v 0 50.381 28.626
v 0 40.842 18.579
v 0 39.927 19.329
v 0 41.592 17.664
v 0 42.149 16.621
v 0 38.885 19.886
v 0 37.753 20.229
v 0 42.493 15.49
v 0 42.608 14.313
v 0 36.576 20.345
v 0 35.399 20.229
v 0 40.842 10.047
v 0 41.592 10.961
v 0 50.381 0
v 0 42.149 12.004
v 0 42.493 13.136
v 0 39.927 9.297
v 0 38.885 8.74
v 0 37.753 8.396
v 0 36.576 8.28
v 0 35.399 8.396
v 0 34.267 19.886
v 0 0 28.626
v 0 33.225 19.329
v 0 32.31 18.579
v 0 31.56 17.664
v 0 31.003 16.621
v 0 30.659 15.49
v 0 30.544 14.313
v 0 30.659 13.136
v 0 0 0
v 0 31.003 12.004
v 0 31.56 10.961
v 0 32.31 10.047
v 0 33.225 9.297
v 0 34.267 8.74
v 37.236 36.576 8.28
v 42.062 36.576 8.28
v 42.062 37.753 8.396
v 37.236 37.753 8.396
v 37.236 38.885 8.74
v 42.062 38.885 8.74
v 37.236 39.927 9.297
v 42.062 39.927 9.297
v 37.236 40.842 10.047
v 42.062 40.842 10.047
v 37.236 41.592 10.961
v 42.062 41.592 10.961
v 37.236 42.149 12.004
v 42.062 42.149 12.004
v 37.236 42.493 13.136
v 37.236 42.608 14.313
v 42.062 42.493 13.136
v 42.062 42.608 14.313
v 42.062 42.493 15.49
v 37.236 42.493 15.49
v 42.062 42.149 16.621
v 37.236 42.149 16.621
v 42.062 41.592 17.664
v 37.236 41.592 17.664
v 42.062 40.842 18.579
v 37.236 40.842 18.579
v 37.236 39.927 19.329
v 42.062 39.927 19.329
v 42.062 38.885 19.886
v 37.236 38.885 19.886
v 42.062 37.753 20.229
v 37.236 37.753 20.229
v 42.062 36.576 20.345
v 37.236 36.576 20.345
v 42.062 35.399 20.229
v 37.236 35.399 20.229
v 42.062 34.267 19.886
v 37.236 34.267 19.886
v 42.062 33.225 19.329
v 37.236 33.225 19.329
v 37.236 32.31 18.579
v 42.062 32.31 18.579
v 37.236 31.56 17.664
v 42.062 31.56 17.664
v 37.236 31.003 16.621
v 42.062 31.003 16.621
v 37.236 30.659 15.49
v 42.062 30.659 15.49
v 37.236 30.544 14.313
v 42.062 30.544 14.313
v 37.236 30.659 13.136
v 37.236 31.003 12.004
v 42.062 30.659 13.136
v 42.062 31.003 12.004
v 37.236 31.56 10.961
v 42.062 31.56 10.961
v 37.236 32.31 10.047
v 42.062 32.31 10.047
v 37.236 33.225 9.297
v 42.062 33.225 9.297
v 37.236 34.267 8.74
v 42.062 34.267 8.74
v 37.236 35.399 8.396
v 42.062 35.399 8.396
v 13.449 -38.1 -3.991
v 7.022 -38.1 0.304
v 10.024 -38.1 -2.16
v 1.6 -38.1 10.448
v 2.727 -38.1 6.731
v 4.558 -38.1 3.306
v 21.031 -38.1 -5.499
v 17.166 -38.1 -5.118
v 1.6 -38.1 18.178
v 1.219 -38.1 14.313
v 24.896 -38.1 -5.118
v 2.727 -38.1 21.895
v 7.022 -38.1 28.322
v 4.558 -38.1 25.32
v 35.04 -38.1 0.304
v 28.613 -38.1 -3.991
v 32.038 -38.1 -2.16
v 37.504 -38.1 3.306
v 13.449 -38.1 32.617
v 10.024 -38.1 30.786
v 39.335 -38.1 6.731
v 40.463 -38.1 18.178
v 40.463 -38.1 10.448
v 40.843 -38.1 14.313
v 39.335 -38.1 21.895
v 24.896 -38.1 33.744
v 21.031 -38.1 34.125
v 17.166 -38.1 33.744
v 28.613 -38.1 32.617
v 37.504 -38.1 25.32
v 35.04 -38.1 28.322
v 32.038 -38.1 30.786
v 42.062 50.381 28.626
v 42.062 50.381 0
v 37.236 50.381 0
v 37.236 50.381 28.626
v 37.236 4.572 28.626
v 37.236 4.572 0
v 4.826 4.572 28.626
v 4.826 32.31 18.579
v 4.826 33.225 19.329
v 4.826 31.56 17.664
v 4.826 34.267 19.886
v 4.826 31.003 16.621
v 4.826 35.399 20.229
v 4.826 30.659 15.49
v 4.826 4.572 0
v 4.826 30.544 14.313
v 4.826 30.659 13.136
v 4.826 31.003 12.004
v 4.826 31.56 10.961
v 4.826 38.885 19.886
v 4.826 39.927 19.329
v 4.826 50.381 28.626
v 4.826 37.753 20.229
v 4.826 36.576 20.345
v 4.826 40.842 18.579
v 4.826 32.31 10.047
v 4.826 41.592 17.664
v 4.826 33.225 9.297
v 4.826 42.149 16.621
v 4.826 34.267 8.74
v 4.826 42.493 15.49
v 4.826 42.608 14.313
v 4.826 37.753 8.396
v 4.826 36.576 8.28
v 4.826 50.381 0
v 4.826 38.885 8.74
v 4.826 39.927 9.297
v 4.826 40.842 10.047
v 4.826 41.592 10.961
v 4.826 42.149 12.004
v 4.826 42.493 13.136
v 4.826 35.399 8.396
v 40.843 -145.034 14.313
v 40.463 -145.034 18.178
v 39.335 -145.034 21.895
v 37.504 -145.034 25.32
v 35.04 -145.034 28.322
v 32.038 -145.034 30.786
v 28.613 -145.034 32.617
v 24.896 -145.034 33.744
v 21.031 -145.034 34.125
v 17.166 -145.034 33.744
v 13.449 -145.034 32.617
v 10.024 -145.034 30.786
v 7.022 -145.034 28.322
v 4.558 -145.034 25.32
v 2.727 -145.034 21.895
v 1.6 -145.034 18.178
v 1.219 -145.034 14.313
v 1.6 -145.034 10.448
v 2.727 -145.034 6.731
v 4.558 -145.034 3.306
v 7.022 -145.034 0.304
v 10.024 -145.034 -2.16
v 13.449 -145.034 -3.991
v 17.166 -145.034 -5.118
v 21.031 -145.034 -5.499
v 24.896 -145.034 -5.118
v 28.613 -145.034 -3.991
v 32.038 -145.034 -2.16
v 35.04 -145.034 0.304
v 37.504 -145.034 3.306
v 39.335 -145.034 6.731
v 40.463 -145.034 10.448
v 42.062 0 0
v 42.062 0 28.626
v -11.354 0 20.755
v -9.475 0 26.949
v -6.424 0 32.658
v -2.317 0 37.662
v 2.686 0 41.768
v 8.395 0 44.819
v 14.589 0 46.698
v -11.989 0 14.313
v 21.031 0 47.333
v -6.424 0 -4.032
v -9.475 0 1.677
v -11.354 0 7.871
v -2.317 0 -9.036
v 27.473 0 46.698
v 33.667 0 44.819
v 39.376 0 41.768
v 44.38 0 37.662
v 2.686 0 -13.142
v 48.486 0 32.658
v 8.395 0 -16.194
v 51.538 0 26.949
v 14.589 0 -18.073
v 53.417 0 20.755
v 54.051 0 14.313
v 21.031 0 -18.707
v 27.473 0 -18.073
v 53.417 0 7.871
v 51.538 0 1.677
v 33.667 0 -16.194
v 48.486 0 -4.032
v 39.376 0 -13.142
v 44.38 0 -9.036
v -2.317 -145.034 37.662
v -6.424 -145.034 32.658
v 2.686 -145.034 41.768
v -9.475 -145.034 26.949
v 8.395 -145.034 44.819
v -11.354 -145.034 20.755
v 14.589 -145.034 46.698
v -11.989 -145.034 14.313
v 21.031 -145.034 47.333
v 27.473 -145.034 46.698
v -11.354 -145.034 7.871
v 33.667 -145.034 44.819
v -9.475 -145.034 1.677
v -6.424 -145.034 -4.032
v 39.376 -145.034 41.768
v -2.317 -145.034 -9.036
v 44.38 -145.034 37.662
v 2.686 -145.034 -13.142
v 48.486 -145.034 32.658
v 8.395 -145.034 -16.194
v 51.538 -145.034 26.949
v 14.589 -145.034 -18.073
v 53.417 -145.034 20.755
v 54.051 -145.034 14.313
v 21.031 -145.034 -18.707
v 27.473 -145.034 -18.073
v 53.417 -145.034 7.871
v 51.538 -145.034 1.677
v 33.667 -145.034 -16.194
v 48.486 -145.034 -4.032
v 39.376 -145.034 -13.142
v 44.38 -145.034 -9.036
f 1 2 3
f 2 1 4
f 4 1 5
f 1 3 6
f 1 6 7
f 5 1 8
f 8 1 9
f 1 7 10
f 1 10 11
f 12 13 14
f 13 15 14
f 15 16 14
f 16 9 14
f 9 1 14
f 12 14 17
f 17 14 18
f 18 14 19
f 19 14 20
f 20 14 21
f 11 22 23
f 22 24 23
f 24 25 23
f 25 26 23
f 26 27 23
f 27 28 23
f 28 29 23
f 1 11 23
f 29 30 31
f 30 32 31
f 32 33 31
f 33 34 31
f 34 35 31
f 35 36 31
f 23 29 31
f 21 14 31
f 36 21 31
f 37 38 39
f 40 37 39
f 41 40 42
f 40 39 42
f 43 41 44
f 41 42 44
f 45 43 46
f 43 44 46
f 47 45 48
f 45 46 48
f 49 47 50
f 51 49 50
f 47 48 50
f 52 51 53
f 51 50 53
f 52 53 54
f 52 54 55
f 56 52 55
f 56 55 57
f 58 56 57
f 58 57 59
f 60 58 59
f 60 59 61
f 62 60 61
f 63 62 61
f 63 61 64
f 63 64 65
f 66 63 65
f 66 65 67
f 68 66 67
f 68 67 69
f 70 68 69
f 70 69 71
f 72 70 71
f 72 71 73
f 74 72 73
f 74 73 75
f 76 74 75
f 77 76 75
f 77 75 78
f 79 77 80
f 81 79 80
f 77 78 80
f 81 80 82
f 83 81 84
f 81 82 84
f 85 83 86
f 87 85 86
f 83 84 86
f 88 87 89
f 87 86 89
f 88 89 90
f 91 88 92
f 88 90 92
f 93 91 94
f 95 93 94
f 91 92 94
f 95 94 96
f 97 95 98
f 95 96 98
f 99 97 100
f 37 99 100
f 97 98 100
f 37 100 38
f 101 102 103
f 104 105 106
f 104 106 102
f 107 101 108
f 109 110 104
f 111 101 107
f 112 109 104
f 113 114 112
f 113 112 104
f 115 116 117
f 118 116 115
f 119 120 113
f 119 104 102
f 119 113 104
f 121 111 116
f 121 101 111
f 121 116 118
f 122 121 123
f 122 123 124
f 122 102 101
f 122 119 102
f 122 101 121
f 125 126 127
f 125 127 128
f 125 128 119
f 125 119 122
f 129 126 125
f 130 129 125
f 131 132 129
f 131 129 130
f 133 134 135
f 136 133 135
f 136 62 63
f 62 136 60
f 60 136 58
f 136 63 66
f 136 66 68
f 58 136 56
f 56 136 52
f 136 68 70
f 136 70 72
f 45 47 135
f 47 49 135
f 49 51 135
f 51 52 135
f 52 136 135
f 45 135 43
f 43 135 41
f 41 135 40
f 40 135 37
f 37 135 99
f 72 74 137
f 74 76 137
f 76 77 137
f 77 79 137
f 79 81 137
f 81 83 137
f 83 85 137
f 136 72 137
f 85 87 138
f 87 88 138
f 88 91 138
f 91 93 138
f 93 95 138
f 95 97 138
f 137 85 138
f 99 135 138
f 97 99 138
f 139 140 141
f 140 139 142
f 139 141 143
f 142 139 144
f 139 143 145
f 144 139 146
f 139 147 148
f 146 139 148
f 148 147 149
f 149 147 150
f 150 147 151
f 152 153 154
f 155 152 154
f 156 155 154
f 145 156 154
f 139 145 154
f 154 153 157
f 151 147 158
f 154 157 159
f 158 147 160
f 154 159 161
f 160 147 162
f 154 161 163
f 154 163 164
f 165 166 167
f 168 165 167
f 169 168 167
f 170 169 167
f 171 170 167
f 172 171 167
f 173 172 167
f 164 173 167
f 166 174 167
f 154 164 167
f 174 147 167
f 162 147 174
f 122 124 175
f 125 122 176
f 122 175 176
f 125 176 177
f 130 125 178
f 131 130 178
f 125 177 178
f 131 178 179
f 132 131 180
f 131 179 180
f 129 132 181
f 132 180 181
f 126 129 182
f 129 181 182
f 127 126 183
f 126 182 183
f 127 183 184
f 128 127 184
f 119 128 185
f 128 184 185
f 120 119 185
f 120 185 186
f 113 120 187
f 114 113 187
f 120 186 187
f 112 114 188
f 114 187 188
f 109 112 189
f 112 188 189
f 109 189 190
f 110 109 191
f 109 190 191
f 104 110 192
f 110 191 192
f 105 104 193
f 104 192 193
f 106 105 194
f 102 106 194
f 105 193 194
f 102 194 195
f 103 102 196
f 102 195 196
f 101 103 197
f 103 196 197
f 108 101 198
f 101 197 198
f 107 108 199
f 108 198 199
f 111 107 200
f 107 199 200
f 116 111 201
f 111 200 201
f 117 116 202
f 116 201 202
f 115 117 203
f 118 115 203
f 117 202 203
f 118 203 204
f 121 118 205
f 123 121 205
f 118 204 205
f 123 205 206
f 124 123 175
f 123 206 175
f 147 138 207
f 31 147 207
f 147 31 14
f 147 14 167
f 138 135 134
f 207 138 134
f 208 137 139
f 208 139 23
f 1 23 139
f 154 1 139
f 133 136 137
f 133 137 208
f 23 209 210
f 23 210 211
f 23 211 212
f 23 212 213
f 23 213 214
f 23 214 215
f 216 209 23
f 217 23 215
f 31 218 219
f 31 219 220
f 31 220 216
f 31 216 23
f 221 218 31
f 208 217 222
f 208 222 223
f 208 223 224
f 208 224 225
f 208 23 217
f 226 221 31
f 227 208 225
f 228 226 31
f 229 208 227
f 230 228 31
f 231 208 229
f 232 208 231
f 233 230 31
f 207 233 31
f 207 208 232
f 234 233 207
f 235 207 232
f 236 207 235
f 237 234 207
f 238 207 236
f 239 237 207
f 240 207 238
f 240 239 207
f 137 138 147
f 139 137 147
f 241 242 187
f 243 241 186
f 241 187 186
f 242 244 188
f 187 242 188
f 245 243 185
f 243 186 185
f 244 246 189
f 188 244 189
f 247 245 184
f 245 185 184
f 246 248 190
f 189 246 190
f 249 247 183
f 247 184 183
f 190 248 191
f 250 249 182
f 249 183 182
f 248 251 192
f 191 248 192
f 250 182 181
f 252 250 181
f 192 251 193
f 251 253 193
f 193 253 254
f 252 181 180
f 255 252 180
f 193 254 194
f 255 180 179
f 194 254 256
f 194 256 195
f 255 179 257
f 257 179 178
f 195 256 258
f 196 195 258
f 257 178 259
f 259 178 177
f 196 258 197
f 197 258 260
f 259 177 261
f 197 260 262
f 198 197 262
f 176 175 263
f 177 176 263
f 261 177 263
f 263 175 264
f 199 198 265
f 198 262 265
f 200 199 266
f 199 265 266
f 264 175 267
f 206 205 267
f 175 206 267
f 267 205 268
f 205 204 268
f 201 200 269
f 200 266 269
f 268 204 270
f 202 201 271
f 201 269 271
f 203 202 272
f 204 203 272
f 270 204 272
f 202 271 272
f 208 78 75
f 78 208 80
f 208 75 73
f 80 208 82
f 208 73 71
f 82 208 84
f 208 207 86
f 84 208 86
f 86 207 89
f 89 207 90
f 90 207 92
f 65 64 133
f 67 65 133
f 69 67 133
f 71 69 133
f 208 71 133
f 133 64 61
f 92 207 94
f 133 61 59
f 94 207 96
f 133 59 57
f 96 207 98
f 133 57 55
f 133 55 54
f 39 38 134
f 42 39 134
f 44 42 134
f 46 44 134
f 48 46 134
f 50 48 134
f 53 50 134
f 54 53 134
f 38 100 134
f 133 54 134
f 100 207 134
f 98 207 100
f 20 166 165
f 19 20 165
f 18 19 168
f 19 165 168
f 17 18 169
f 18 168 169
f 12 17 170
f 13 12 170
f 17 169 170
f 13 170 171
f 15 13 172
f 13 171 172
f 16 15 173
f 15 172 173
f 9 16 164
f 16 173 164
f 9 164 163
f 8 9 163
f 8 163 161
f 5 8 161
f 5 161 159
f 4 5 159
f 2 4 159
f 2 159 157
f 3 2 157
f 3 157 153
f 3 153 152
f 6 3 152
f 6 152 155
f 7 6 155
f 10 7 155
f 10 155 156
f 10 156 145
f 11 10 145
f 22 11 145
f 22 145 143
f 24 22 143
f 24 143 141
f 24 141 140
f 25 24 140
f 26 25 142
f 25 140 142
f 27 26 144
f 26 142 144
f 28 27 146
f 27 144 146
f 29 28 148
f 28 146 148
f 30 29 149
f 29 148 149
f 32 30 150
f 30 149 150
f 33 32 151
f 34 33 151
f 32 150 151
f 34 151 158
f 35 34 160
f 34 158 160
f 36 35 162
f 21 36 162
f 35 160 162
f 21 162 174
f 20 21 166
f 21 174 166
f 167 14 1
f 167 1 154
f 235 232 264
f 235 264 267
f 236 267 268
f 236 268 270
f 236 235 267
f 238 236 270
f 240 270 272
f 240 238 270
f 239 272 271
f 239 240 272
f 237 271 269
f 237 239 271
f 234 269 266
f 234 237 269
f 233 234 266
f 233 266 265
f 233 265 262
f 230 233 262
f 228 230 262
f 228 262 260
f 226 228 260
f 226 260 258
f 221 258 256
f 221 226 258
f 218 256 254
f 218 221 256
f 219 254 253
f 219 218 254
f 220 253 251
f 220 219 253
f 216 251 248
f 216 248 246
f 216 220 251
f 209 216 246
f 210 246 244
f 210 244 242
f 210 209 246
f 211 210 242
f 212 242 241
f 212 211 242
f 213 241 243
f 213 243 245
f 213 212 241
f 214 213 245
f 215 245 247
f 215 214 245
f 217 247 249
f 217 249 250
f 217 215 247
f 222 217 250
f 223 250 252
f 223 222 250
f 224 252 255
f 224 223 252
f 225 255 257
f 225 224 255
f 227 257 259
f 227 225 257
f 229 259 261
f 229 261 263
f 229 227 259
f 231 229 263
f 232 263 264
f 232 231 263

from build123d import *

# Parameters (mm, degrees)
SKETCH1_W           = 4.826
SKETCH1_H           = 25.19045
BOSS_EXTRUDE1_DEPTH = 28.6258
SKETCH2_R           = 25.4
BOSS_EXTRUDE2_DEPTH = 145.034
SKETCH4_R           = 33.02
BOSS_EXTRUDE3_DEPTH = 145.034
SKETCH5_R           = 6.0325
CUT_EXTRUDE2_DEPTH  = 55.0512
SKETCH6_R           = 19.812
CUT_EXTRUDE3_DEPTH  = 106.934


with BuildPart() as part:
    # Sketch1 → Boss-Extrude1 (new body)
    with BuildSketch(Plane.XY):
        Polygon((37.2364, 24.806452693), (42.0624, 24.806452693), (42.0624, 50.3809), (37.2364, 50.3809), (37.2364, 25.19045), align=None)
        Polygon((21.0312, 4.572), (21.0312, 0), (42.0624, 0), (42.0624, 24.806452693), (37.2364, 24.806452693), (37.2364, 4.572), align=None)
        Polygon((0, 0), (21.0312, 0), (21.0312, 4.572), (4.826, 4.572), (4.826, 25.19045), (0, 25.19045), align=None)
        with Locations((2.413, 37.785675)):
            Rectangle(SKETCH1_W, SKETCH1_H)
    extrude(amount=BOSS_EXTRUDE1_DEPTH)

    # Sketch2 → Boss-Extrude2 (add)
    with BuildSketch(Plane.XZ):
        with Locations((21.0312, 14.3129)):
            Circle(SKETCH2_R)
    extrude(amount=BOSS_EXTRUDE2_DEPTH)

    # Sketch4 → Boss-Extrude3 (add)
    with BuildSketch(Plane(origin=(0, 0, 0), x_dir=(1, 0, 0), z_dir=(0, 1, 0))):
        with Locations((21.0312, -14.3129)):
            Circle(SKETCH4_R)
    extrude(amount=-BOSS_EXTRUDE3_DEPTH)

    # Sketch5 → Cut-Extrude2 (cut, through all)
    with BuildSketch(Plane(origin=(42.0624, 0, 0), x_dir=(0, 0, -1), z_dir=(1, 0, 0))):
        with Locations((-14.3129, 36.576)):
            Circle(SKETCH5_R)
    extrude(amount=-CUT_EXTRUDE2_DEPTH, mode=Mode.SUBTRACT)

    # Sketch6 → Cut-Extrude3 (cut)
    with BuildSketch(Plane.XZ.offset(145.034)):
        with Locations((21.0312, 14.3129)):
            Circle(SKETCH6_R)
    extrude(amount=-CUT_EXTRUDE3_DEPTH, mode=Mode.SUBTRACT)


solid = part.part
